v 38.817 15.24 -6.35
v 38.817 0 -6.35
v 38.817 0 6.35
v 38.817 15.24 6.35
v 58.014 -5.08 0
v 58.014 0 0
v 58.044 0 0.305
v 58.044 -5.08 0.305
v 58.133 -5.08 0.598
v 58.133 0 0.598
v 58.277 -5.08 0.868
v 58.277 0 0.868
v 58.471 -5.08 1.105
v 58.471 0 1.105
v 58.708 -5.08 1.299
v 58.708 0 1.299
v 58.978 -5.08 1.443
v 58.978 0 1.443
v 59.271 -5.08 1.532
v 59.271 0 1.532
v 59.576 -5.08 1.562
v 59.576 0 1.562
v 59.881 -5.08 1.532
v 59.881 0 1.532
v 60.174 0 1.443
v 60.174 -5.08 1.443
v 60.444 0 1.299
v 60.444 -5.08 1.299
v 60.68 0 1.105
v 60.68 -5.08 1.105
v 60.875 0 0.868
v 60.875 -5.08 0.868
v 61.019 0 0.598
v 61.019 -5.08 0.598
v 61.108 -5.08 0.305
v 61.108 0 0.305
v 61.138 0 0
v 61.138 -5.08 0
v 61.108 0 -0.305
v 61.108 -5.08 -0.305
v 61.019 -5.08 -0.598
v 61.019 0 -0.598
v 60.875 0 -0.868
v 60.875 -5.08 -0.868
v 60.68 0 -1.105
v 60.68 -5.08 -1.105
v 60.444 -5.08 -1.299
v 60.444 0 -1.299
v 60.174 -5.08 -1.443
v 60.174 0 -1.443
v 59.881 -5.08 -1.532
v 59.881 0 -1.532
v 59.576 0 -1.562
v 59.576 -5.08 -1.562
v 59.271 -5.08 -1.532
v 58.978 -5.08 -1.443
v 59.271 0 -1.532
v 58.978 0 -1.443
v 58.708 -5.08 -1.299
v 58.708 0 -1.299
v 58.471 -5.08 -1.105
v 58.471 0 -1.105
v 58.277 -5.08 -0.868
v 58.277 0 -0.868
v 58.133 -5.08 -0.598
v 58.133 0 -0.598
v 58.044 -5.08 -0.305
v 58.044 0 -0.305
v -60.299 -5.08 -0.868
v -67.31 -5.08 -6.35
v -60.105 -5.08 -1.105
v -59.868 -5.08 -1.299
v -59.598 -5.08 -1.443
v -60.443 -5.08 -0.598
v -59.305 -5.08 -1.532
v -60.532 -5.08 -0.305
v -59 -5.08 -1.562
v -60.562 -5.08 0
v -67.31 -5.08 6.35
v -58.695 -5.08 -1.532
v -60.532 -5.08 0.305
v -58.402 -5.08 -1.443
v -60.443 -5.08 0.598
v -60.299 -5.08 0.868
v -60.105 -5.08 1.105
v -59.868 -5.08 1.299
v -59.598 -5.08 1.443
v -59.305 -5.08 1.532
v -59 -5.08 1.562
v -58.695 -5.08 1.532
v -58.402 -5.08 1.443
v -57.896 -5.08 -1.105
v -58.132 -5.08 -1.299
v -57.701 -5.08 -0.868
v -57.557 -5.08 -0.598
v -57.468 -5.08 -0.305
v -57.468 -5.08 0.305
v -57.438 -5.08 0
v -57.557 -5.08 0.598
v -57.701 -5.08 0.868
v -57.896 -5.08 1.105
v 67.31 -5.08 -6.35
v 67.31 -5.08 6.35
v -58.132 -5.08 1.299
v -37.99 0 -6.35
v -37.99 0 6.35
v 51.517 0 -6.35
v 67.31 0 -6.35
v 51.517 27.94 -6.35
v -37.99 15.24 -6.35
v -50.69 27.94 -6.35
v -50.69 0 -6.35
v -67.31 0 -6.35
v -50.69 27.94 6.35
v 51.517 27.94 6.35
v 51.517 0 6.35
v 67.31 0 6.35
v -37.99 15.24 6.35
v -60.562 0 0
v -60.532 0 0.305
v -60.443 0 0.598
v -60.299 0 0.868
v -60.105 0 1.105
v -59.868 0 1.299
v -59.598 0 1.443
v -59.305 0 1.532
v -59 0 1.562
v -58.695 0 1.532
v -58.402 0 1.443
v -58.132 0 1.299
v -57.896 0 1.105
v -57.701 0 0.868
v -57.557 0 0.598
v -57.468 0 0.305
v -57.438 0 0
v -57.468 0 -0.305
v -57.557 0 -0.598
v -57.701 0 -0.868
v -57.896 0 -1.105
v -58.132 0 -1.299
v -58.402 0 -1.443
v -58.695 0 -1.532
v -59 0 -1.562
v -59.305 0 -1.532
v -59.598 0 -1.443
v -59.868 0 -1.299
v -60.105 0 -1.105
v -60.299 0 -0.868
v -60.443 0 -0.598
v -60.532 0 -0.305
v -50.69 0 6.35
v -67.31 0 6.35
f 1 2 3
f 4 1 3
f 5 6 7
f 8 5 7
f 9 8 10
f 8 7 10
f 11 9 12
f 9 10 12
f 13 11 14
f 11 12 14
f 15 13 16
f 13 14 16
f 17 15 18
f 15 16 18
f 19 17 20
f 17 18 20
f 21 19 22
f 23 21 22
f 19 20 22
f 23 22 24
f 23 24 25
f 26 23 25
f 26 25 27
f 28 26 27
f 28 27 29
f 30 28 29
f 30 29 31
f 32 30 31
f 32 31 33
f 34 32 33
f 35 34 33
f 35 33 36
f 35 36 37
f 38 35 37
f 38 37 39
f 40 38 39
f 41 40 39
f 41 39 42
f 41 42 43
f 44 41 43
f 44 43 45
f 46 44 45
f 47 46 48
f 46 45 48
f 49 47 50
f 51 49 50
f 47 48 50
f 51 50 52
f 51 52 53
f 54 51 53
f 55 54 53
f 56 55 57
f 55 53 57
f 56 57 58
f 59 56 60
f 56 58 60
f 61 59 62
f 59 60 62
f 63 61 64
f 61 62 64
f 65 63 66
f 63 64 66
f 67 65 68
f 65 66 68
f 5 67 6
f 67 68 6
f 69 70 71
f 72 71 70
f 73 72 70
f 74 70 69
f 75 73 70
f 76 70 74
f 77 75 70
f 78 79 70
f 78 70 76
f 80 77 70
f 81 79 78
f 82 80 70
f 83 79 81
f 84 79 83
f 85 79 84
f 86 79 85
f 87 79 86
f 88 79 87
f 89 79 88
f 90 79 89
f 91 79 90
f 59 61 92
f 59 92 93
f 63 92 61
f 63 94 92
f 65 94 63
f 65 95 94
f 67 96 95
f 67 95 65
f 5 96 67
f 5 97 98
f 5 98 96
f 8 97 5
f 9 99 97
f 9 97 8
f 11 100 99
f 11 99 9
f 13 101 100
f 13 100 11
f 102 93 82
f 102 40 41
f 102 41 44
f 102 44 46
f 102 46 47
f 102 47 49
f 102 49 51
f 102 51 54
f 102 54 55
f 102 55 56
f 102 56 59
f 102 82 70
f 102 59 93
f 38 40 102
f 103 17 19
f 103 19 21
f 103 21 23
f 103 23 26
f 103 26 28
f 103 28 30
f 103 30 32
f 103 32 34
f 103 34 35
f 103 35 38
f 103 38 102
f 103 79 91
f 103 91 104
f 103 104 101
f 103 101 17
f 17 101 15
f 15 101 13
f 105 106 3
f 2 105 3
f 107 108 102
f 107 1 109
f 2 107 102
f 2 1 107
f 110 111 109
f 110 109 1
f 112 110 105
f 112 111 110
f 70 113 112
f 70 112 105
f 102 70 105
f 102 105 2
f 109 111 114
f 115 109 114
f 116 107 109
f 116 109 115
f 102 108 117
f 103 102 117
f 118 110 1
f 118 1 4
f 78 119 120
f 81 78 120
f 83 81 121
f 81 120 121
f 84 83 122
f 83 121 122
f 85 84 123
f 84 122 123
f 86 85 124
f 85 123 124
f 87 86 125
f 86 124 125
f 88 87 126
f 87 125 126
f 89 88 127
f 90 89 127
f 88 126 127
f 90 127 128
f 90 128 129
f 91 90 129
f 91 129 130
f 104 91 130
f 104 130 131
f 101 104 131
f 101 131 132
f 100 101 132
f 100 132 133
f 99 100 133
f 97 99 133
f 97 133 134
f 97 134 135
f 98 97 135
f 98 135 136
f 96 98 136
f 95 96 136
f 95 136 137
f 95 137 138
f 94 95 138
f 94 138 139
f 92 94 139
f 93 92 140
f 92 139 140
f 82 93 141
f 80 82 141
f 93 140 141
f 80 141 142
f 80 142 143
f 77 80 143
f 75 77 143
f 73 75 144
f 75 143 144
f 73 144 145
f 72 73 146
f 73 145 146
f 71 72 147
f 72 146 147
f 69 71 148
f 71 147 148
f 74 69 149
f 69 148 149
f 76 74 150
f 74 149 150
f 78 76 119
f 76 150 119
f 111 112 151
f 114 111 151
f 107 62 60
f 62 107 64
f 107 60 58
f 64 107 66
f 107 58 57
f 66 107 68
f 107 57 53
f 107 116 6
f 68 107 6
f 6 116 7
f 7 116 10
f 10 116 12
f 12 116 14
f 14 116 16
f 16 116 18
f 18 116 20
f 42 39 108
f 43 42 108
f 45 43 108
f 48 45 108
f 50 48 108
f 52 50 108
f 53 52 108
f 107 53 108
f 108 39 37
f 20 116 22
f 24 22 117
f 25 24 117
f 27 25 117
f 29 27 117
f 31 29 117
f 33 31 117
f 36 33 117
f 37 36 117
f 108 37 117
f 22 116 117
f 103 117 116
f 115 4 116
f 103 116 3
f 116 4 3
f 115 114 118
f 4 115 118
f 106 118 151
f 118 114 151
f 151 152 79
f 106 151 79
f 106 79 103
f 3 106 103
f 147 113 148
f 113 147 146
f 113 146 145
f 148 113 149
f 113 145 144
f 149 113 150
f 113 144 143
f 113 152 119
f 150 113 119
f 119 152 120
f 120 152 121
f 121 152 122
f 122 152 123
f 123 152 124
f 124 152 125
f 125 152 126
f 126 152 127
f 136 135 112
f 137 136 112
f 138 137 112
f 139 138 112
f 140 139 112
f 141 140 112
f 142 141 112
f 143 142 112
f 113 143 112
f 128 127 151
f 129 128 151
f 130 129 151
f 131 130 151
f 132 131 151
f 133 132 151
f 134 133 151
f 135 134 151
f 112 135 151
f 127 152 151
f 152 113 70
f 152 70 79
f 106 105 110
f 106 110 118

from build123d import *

# Parameters (mm, degrees)
F0_W     = 134.62
F0_H     = 12.7
F1_DEPTH = 5.08
F2_W     = 12.7
F2_H     = 12.7
F3_DEPTH = 27.94
F4_W     = 12.7
F4_H     = 12.7
F5_DEPTH = 99.314
F6_R     = 1.5621
F7_DEPTH = 25.4
F8_R     = 1.5621
F9_DEPTH = 25.4


with BuildPart() as f1:
    # F0 (on Front) → F1 (new body)
    with BuildSketch(Plane.XZ):
        Rectangle(F0_W, F0_H)
    extrude(amount=F1_DEPTH)

    # F2 (on face) → F3 (join)
    with BuildSketch(Plane(origin=(0, 0, 0), x_dir=(-1, 0, 0), z_dir=(0, 1, 0))):
        with Locations((-45.16723, 0)):
            Rectangle(F2_W, F2_H)
        with Locations((44.340361, 0)):
            Rectangle(F2_W, F2_H)
    extrude(amount=F3_DEPTH)

    # F4 (on face) → F5 (join)
    with BuildSketch(Plane(origin=(-50.690361, 0, 0), x_dir=(0, -1, 0), z_dir=(-1, 0, 0))):
        with Locations((-21.59, 0)):
            Rectangle(F4_W, F4_H)
    extrude(amount=-F5_DEPTH)

    # F6 (on face) → F7 (cut)
    with BuildSketch(Plane(origin=(0, 0, 0), x_dir=(-1, 0, 0), z_dir=(0, 1, 0))):
        with Locations((-59.575792, 0)):
            Circle(F6_R)
    extrude(amount=-F7_DEPTH, mode=Mode.SUBTRACT)

    # F8 (on face) → F9 (cut)
    with BuildSketch(Plane(origin=(0, 0, 0), x_dir=(-1, 0, 0), z_dir=(0, 1, 0))):
        with Locations((59.000183, 0)):
            Circle(F8_R)
    extrude(amount=-F9_DEPTH, mode=Mode.SUBTRACT)


solid = f1.part
